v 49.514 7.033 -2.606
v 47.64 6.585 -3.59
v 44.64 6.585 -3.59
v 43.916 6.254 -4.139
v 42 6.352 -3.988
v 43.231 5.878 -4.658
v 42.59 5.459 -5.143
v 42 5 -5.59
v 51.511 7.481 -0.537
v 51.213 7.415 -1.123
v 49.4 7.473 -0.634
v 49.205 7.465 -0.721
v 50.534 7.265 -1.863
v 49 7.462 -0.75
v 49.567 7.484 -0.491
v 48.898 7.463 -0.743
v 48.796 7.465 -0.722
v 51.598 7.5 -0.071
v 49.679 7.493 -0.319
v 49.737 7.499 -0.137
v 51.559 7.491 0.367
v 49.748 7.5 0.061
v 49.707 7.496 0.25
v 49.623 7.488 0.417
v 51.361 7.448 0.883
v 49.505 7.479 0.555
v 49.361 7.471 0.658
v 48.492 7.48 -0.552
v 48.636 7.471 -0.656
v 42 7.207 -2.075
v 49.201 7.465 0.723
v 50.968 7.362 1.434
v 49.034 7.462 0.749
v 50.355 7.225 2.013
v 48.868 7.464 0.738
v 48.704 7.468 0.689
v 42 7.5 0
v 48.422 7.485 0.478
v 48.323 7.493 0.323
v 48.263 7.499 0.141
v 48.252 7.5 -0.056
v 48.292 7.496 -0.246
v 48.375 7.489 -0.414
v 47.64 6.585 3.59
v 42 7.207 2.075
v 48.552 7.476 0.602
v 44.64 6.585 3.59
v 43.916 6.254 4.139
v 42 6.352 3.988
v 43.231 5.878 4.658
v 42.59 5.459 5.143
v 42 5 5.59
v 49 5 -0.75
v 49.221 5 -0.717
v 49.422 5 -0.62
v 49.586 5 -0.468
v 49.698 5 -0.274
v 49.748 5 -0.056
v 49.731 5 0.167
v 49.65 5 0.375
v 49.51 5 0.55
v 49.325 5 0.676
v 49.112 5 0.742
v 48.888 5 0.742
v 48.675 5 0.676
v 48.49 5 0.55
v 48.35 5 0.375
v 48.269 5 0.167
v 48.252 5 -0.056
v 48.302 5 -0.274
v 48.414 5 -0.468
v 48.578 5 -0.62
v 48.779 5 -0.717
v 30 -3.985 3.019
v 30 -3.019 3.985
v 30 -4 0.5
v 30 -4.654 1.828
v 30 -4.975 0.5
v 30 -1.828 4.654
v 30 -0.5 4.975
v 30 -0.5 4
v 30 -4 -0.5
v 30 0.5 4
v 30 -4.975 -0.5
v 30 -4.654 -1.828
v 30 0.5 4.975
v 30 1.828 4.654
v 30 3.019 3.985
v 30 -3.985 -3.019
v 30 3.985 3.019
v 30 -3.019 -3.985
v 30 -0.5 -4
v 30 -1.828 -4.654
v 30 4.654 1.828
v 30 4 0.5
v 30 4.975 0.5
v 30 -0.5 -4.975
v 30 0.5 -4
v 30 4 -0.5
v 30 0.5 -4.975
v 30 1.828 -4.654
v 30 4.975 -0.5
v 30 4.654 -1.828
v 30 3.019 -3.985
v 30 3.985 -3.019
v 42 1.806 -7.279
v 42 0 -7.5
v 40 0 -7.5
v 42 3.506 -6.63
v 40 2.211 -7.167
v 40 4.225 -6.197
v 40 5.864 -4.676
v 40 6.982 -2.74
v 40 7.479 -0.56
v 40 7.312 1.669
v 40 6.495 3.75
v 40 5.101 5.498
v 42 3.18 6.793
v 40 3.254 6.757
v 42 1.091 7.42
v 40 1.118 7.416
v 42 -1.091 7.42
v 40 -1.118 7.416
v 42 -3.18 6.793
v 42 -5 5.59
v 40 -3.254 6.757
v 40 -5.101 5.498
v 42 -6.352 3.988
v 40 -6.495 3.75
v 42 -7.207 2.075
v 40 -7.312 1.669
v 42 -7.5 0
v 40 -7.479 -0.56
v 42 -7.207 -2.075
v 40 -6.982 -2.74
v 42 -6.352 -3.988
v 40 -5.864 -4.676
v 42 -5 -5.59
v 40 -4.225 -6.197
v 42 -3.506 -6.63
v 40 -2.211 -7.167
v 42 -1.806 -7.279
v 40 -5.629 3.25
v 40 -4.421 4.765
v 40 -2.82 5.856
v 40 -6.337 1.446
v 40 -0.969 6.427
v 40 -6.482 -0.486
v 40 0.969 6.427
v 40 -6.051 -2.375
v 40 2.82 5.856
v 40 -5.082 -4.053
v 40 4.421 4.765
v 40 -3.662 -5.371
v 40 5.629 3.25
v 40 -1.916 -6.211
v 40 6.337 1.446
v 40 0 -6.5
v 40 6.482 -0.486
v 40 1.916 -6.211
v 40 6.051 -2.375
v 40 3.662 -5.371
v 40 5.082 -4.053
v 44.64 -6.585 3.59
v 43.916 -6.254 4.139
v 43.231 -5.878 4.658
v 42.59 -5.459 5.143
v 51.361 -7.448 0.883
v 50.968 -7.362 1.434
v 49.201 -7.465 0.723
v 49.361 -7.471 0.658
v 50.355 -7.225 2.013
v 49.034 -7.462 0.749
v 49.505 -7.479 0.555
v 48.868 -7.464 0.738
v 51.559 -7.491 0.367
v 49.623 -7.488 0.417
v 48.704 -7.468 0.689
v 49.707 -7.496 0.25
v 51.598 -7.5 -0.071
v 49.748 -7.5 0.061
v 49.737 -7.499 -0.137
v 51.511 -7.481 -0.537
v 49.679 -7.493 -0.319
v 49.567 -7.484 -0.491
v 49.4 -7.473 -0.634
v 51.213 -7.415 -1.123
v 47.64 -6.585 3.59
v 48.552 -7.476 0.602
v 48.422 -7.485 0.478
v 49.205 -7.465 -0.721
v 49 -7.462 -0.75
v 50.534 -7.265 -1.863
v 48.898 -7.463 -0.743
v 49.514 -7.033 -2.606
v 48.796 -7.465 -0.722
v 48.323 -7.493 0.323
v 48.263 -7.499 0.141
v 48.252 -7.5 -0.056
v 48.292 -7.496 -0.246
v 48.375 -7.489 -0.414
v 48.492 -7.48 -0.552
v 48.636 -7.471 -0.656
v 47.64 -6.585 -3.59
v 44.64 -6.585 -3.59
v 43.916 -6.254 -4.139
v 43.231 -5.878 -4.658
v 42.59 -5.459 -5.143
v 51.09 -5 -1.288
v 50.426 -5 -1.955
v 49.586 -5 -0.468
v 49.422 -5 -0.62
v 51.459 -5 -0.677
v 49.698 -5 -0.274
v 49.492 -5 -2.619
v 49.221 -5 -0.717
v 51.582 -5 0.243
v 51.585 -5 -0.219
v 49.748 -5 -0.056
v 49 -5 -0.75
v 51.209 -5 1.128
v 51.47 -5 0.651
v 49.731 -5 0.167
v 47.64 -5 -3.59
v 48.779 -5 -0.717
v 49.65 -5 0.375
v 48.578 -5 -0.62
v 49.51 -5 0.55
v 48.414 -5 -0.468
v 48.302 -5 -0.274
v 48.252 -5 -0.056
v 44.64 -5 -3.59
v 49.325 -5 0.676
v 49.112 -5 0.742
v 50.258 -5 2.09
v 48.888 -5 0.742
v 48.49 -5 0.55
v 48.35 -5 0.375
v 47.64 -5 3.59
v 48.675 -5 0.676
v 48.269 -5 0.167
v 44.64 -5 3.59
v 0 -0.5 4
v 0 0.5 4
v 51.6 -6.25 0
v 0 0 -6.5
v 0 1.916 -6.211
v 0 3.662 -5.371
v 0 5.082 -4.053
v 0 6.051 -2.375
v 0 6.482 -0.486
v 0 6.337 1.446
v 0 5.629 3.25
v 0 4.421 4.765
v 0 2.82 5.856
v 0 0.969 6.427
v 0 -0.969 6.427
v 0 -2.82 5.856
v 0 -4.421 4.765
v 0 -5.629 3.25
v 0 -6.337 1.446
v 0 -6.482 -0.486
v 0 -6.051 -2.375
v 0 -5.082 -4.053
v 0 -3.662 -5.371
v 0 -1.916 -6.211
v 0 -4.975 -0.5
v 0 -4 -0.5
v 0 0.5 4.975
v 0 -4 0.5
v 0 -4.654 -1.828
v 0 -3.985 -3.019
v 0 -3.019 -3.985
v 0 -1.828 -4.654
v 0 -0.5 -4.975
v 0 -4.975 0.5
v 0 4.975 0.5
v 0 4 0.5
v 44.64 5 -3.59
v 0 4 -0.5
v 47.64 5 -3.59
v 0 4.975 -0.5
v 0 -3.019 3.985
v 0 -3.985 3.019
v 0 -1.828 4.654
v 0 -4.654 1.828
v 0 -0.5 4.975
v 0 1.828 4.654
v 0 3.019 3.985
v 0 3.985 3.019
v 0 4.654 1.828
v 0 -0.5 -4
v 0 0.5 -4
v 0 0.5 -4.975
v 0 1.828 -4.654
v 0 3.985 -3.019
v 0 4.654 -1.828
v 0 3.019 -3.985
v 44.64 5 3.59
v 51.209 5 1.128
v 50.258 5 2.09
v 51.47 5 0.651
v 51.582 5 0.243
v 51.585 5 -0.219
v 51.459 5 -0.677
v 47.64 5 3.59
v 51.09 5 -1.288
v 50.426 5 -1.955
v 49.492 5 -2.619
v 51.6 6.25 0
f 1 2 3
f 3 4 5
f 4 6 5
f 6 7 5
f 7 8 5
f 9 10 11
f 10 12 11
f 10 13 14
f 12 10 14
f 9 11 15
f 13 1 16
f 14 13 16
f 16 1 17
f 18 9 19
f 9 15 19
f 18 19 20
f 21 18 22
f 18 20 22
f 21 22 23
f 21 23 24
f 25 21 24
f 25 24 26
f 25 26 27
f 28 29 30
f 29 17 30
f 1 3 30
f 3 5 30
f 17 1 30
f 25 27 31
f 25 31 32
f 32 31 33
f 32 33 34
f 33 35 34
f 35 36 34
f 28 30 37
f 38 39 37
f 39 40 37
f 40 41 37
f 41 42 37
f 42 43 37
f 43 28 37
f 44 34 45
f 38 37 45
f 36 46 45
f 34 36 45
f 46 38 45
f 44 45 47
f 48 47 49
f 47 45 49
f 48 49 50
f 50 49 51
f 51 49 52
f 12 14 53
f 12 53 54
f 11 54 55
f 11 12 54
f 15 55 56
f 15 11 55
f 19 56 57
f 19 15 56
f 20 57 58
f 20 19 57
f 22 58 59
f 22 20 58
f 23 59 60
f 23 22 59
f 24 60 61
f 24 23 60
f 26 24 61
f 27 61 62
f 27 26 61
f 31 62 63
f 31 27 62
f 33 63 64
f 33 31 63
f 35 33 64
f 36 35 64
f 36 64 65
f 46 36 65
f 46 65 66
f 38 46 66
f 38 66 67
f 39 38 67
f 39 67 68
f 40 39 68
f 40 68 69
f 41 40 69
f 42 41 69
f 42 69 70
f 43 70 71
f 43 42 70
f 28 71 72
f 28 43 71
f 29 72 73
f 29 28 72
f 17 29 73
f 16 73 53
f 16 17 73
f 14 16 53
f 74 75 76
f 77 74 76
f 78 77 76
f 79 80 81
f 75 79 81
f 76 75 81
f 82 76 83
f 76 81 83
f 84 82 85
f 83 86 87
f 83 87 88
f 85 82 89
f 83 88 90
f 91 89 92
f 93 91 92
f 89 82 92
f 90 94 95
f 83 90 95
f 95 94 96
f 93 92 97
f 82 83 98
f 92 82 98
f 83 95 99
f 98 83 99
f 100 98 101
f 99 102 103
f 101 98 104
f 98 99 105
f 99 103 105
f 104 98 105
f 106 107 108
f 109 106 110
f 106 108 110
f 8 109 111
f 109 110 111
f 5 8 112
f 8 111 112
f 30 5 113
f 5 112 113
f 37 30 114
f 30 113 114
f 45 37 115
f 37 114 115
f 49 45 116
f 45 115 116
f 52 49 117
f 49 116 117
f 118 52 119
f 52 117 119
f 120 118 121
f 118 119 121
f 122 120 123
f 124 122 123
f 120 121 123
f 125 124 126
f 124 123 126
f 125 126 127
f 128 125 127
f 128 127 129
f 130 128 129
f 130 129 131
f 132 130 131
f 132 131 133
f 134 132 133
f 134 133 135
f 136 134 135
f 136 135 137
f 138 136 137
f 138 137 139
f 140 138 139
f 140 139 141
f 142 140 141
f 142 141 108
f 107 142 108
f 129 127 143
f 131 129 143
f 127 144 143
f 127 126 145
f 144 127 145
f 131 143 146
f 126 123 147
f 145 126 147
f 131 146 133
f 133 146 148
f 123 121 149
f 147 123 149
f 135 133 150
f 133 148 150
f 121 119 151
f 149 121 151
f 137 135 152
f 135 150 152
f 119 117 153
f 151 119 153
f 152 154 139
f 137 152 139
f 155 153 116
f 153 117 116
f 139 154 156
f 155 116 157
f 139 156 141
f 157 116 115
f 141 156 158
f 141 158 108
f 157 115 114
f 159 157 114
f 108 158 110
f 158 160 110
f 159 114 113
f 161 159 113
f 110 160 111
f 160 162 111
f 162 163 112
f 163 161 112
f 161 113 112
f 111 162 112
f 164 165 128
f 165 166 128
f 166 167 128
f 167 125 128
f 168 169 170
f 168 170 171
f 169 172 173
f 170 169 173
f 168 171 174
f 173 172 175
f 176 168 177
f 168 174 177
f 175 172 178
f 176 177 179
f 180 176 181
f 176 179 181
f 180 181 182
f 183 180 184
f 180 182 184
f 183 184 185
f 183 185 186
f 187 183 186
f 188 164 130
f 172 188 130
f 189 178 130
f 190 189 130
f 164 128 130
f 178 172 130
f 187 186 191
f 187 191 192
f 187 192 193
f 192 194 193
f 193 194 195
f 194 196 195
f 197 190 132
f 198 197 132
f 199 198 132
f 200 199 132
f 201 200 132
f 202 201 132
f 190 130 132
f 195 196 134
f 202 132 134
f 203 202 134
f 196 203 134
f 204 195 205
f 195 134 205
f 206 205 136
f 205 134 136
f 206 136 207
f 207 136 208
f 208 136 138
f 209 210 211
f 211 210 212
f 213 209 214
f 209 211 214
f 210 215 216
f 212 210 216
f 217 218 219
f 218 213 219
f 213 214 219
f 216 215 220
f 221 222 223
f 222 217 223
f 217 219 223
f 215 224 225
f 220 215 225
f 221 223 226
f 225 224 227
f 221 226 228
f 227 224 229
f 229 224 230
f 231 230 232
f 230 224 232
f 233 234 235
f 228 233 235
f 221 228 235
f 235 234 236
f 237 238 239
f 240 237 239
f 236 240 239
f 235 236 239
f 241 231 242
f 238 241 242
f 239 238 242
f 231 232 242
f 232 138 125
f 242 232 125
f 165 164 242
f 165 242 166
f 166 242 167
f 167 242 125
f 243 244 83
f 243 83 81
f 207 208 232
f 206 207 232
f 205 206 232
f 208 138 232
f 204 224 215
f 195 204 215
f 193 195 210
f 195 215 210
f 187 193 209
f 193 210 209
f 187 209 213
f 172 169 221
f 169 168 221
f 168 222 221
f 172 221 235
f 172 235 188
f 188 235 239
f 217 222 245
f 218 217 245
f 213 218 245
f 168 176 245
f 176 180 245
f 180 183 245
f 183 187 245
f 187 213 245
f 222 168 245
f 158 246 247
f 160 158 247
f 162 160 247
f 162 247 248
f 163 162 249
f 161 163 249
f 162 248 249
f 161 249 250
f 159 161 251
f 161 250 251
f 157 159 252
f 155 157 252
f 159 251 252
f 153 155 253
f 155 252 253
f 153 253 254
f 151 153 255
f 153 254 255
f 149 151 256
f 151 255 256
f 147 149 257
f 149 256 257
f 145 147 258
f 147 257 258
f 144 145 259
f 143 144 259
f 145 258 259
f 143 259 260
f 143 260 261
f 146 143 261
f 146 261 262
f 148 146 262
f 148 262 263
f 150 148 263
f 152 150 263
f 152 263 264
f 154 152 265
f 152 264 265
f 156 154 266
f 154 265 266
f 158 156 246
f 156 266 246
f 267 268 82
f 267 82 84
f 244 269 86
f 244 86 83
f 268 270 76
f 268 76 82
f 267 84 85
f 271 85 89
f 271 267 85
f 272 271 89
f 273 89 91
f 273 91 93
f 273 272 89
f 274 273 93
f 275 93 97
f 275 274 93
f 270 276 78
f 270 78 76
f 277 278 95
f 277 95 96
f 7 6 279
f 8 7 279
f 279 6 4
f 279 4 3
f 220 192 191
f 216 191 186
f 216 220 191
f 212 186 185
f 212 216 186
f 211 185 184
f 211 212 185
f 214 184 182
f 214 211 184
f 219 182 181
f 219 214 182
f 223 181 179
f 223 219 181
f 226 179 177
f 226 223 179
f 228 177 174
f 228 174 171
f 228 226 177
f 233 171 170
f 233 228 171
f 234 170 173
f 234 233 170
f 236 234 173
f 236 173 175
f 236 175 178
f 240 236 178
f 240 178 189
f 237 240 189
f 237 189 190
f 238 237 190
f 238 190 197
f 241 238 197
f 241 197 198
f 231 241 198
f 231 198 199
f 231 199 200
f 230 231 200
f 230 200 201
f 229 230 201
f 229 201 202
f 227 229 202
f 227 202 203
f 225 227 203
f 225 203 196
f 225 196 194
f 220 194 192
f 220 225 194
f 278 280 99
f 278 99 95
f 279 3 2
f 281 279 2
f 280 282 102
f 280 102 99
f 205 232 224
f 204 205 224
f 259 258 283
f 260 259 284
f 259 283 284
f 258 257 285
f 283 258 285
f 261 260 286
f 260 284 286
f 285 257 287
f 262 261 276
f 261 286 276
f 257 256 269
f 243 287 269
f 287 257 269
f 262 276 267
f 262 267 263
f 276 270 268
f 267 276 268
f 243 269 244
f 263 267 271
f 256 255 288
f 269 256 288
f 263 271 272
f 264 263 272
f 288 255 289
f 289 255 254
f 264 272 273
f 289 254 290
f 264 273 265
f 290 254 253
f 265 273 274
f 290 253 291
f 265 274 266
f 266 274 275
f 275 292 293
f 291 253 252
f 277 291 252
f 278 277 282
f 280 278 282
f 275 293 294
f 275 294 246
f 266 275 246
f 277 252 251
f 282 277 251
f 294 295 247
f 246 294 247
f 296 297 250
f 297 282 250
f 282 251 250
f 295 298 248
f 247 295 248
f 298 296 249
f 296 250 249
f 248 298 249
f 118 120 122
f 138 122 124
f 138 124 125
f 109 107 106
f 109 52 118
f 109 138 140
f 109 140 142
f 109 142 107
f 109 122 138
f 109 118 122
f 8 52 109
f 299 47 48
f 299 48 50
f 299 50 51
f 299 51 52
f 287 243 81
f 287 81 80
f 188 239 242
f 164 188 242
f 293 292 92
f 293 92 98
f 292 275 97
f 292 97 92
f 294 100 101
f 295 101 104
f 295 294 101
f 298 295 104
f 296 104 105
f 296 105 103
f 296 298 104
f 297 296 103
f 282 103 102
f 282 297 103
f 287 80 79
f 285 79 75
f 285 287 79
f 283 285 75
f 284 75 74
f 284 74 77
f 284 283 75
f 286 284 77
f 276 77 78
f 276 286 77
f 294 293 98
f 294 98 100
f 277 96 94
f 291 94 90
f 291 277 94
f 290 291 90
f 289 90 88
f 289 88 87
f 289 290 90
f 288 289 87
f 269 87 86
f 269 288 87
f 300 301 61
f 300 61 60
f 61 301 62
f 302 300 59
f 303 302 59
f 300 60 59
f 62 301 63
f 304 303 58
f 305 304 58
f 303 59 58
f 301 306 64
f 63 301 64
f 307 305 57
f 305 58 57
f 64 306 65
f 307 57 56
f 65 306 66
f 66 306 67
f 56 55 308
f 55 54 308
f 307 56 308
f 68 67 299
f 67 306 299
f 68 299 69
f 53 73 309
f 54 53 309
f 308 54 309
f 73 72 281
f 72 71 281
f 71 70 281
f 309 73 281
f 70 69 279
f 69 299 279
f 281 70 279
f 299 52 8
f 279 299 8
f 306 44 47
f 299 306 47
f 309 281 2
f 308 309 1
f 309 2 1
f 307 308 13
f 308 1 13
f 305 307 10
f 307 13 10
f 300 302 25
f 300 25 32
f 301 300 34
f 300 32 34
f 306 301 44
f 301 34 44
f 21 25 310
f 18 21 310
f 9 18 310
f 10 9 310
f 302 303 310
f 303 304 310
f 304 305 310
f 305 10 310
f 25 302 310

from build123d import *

# Parameters (mm, degrees)
SKETCH1_R               = 6.5
BOSS_EXTRUDE1_DEPTH     = 40
SKETCH2_R               = 7.5
BOSS_EXTRUDE2_DEPTH     = 2
BOSS_EXTRUDE3_DEPTH     = 10
CUT_EXTRUDE1_DEPTH      = 55.004629431
CUT_EXTRUDE1_DEPTH_BACK = 55.004629431
CUT_EXTRUDE2_DEPTH      = 54.619586107
CUT_EXTRUDE2_DEPTH_BACK = 54.619586107
SKETCH5_R               = 0.75
CUT_EXTRUDE3_DEPTH      = 30


with BuildPart() as part:
    # Sketch1 → Boss-Extrude1 (new body)
    with BuildSketch(Plane(origin=(0, 0, 0), x_dir=(0, 0, -1), z_dir=(1, 0, 0))):
        Circle(SKETCH1_R)
    extrude(amount=BOSS_EXTRUDE1_DEPTH)

    # Sketch2 → Boss-Extrude2 (add)
    with BuildSketch(Plane(origin=(40, 0, 0), x_dir=(0, 0, -1), z_dir=(1, 0, 0))):
        Circle(SKETCH2_R)
    extrude(amount=BOSS_EXTRUDE2_DEPTH)

    # Sketch3 → Boss-Extrude3 (add)
    with BuildSketch(Plane(origin=(42, 0, 0), x_dir=(0, 0, -1), z_dir=(1, 0, 0))):
        with BuildLine():
            ThreePointArc((5.590169944, 5), (0, 7.5), (-5.590169944, 5))
            Line((-5.590169944, 5), (-4.898979486, 5))
            Line((-4.898979486, 5), (4.898979486, 5))
            Line((4.898979486, 5), (5.590169944, 5))
        make_face()
        with BuildLine():
            Line((-4.898979486, -5), (-5.590169944, -5))
            ThreePointArc((-5.590169944, -5), (0, -7.5), (5.590169944, -5))
            Line((5.590169944, -5), (4.898979486, -5))
            Line((4.898979486, -5), (-4.898979486, -5))
        make_face()
    extrude(amount=BOSS_EXTRUDE3_DEPTH)

    # Sketch4 → Cut-Extrude1 (cut, two sides: drawn at the far end of the back side and taken through both)
    with BuildSketch(Plane.XZ.offset(-5).offset(-CUT_EXTRUDE1_DEPTH_BACK)):
        with BuildLine():
            Line((42, 5.590169944), (52, 5.590169944))
            Line((52, 5.590169944), (52, -5.590169944))
            Line((52, -5.590169944), (42, -5.590169944))
            Line((42, -5.590169944), (44.640400827, -3.590169944))
            Line((44.640400827, -3.590169944), (47.640400827, -3.590169944))
            add(Edge.make_bspline(
                [(47.640400827, -3.590169944), (50.280133609, -2.393446629), (52.919866391, 0), (50.280133609, 2.393446629), (47.640400827, 3.590169944)],
                knots=[0.178885438, 0.178885438, 0.178885438, 0.178885438, 0.5, 0.821114562, 0.821114562, 0.821114562, 0.821114562], degree=3))
            Line((47.640400827, 3.590169944), (44.640400827, 3.590169944))
            Line((44.640400827, 3.590169944), (42, 5.590169944))
        make_face()
    extrude(amount=CUT_EXTRUDE1_DEPTH + CUT_EXTRUDE1_DEPTH_BACK, mode=Mode.SUBTRACT)

    # Sketch5 → Cut-Extrude2 (cut, two sides: drawn at the far end of the back side and taken through both)
    with BuildSketch(Plane.XZ.offset(-5).offset(-CUT_EXTRUDE2_DEPTH_BACK)):
        with Locations(Location((49, 0, 0), (0, 0, 270))):
            Circle(SKETCH5_R)
    extrude(amount=CUT_EXTRUDE2_DEPTH + CUT_EXTRUDE2_DEPTH_BACK, mode=Mode.SUBTRACT)

    # Sketch6 → Cut-Extrude3 (cut)
    with BuildSketch(Plane.ZY):
        with BuildLine():
            Line((4, -0.5), (4.974937186, -0.5))
            ThreePointArc((4.974937186, -0.5), (3.535533906, -3.535533906), (0.5, -4.974937186))
            Line((0.5, -4.974937186), (0.5, -4))
            Line((0.5, -4), (-0.5, -4))
            Line((-0.5, -4), (-0.5, -4.974937186))
            ThreePointArc((-0.5, -4.974937186), (-3.535533906, -3.535533906), (-4.974937186, -0.5))
            Line((-4.974937186, -0.5), (-4, -0.5))
            Line((-4, -0.5), (-4, 0.5))
            Line((-4, 0.5), (-4.974937186, 0.5))
            ThreePointArc((-4.974937186, 0.5), (-3.535533906, 3.535533906), (-0.5, 4.974937186))
            Line((-0.5, 4.974937186), (-0.5, 4))
            Line((-0.5, 4), (0.5, 4))
            Line((0.5, 4), (0.5, 4.974937186))
            ThreePointArc((0.5, 4.974937186), (3.535533906, 3.535533906), (4.974937186, 0.5))
            Line((4.974937186, 0.5), (4, 0.5))
            Line((4, 0.5), (4, -0.5))
        make_face()
    extrude(amount=-CUT_EXTRUDE3_DEPTH, mode=Mode.SUBTRACT)


solid = part.part
